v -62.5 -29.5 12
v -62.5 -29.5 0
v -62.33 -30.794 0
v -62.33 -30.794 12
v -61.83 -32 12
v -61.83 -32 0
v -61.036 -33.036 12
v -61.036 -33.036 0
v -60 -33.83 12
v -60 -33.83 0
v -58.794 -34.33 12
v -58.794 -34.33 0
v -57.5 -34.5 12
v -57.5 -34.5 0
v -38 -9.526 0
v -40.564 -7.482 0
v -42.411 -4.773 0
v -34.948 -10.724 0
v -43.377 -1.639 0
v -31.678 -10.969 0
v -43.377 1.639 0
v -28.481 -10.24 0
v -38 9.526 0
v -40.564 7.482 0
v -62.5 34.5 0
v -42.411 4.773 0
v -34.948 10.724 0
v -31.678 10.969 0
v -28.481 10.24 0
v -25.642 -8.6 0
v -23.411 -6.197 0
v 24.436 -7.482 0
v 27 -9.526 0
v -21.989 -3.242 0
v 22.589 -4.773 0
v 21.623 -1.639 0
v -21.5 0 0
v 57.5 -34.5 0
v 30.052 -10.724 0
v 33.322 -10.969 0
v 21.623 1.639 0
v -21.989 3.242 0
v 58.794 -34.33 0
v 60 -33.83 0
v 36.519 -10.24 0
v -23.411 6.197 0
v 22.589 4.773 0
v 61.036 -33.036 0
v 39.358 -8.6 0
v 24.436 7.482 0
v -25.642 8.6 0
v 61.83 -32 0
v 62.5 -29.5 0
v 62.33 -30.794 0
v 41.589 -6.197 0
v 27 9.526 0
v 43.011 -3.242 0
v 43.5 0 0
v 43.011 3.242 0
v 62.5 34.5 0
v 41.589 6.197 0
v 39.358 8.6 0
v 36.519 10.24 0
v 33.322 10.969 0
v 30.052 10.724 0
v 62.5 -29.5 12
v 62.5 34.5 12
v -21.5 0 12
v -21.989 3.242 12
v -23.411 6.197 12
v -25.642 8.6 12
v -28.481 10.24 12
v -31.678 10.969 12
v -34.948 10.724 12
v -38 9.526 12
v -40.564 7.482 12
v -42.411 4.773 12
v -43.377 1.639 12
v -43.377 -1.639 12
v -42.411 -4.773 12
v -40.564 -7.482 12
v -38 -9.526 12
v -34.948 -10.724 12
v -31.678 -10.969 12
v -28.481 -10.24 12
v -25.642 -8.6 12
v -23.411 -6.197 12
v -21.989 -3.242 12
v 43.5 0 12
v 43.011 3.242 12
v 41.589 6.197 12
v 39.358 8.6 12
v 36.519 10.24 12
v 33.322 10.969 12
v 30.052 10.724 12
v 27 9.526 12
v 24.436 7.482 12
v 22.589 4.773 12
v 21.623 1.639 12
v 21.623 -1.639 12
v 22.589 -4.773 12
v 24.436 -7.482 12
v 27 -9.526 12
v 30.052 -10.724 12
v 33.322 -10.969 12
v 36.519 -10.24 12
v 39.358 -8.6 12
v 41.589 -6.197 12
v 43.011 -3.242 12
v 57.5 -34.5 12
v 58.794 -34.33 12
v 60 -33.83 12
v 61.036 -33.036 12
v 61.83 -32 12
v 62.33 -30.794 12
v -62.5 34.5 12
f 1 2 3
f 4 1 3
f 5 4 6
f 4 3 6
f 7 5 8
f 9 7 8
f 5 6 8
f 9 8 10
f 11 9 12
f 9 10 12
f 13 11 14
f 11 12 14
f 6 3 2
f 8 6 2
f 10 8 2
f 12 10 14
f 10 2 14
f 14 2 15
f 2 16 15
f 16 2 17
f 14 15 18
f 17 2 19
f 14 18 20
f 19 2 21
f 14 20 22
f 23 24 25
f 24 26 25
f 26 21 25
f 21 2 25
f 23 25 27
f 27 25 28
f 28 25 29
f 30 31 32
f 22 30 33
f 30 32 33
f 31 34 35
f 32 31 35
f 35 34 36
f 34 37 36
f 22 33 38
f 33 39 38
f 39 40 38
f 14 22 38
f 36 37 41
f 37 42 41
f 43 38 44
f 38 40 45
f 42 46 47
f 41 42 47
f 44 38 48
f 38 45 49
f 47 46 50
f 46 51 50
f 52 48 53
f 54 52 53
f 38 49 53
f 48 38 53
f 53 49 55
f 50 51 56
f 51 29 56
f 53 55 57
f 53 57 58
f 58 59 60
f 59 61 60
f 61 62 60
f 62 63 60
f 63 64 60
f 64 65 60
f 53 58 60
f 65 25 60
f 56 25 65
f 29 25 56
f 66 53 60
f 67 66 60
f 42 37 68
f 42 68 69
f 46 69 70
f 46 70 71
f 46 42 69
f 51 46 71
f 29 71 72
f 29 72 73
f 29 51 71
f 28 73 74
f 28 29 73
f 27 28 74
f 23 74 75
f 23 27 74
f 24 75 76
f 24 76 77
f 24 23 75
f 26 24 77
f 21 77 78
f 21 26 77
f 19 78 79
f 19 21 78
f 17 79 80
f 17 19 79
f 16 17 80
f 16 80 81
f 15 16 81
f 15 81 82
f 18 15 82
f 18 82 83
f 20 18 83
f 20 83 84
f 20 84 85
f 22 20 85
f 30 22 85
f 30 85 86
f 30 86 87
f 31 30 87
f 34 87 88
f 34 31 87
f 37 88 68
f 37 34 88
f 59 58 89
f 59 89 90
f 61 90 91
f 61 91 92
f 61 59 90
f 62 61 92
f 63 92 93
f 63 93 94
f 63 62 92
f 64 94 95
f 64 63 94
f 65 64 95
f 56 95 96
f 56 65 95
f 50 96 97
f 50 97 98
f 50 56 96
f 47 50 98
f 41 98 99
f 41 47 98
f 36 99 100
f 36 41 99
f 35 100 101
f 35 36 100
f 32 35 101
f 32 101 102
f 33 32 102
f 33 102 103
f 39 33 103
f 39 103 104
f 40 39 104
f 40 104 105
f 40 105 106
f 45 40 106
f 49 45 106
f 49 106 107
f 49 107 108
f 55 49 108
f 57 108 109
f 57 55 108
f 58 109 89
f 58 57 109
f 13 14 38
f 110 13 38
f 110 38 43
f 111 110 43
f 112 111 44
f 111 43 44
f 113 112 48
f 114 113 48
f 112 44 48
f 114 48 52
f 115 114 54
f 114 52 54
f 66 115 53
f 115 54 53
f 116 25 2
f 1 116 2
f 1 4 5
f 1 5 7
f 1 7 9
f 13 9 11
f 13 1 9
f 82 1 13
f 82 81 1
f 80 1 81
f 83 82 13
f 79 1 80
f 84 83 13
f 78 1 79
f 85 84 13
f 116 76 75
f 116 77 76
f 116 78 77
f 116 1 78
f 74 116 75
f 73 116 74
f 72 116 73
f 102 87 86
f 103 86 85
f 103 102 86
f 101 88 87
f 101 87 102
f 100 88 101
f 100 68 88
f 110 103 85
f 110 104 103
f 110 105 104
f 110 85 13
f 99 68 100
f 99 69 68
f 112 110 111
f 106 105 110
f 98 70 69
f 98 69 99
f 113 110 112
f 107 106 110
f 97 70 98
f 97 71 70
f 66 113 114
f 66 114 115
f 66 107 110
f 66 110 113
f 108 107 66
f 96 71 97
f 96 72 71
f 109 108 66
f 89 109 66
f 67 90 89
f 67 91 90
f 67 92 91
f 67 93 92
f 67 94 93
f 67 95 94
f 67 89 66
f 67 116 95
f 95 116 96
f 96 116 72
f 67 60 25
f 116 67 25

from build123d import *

# Parameters (mm, degrees)
F0_R     = 11
F1_DEPTH = 12


with BuildPart() as f1:
    # F0 (on Top) → F1 (new body)
    with BuildSketch(Plane.XY):
        with BuildLine():
            ThreePointArc((-62.5, -29.5), (-61.035534, -33.035534), (-57.5, -34.5))
            Line((-57.5, -34.5), (57.5, -34.5))
            ThreePointArc((57.5, -34.5), (61.035534, -33.035534), (62.5, -29.5))
            Line((62.5, -29.5), (62.5, 34.5))
            Line((62.5, 34.5), (-62.5, 34.5))
            Line((-62.5, 34.5), (-62.5, -29.5))
        make_face()
        with Locations((-32.5, 0)):
            Circle(F0_R, mode=Mode.SUBTRACT)
        with Locations((32.5, 0)):
            Circle(F0_R, mode=Mode.SUBTRACT)
    extrude(amount=F1_DEPTH)


solid = f1.part
